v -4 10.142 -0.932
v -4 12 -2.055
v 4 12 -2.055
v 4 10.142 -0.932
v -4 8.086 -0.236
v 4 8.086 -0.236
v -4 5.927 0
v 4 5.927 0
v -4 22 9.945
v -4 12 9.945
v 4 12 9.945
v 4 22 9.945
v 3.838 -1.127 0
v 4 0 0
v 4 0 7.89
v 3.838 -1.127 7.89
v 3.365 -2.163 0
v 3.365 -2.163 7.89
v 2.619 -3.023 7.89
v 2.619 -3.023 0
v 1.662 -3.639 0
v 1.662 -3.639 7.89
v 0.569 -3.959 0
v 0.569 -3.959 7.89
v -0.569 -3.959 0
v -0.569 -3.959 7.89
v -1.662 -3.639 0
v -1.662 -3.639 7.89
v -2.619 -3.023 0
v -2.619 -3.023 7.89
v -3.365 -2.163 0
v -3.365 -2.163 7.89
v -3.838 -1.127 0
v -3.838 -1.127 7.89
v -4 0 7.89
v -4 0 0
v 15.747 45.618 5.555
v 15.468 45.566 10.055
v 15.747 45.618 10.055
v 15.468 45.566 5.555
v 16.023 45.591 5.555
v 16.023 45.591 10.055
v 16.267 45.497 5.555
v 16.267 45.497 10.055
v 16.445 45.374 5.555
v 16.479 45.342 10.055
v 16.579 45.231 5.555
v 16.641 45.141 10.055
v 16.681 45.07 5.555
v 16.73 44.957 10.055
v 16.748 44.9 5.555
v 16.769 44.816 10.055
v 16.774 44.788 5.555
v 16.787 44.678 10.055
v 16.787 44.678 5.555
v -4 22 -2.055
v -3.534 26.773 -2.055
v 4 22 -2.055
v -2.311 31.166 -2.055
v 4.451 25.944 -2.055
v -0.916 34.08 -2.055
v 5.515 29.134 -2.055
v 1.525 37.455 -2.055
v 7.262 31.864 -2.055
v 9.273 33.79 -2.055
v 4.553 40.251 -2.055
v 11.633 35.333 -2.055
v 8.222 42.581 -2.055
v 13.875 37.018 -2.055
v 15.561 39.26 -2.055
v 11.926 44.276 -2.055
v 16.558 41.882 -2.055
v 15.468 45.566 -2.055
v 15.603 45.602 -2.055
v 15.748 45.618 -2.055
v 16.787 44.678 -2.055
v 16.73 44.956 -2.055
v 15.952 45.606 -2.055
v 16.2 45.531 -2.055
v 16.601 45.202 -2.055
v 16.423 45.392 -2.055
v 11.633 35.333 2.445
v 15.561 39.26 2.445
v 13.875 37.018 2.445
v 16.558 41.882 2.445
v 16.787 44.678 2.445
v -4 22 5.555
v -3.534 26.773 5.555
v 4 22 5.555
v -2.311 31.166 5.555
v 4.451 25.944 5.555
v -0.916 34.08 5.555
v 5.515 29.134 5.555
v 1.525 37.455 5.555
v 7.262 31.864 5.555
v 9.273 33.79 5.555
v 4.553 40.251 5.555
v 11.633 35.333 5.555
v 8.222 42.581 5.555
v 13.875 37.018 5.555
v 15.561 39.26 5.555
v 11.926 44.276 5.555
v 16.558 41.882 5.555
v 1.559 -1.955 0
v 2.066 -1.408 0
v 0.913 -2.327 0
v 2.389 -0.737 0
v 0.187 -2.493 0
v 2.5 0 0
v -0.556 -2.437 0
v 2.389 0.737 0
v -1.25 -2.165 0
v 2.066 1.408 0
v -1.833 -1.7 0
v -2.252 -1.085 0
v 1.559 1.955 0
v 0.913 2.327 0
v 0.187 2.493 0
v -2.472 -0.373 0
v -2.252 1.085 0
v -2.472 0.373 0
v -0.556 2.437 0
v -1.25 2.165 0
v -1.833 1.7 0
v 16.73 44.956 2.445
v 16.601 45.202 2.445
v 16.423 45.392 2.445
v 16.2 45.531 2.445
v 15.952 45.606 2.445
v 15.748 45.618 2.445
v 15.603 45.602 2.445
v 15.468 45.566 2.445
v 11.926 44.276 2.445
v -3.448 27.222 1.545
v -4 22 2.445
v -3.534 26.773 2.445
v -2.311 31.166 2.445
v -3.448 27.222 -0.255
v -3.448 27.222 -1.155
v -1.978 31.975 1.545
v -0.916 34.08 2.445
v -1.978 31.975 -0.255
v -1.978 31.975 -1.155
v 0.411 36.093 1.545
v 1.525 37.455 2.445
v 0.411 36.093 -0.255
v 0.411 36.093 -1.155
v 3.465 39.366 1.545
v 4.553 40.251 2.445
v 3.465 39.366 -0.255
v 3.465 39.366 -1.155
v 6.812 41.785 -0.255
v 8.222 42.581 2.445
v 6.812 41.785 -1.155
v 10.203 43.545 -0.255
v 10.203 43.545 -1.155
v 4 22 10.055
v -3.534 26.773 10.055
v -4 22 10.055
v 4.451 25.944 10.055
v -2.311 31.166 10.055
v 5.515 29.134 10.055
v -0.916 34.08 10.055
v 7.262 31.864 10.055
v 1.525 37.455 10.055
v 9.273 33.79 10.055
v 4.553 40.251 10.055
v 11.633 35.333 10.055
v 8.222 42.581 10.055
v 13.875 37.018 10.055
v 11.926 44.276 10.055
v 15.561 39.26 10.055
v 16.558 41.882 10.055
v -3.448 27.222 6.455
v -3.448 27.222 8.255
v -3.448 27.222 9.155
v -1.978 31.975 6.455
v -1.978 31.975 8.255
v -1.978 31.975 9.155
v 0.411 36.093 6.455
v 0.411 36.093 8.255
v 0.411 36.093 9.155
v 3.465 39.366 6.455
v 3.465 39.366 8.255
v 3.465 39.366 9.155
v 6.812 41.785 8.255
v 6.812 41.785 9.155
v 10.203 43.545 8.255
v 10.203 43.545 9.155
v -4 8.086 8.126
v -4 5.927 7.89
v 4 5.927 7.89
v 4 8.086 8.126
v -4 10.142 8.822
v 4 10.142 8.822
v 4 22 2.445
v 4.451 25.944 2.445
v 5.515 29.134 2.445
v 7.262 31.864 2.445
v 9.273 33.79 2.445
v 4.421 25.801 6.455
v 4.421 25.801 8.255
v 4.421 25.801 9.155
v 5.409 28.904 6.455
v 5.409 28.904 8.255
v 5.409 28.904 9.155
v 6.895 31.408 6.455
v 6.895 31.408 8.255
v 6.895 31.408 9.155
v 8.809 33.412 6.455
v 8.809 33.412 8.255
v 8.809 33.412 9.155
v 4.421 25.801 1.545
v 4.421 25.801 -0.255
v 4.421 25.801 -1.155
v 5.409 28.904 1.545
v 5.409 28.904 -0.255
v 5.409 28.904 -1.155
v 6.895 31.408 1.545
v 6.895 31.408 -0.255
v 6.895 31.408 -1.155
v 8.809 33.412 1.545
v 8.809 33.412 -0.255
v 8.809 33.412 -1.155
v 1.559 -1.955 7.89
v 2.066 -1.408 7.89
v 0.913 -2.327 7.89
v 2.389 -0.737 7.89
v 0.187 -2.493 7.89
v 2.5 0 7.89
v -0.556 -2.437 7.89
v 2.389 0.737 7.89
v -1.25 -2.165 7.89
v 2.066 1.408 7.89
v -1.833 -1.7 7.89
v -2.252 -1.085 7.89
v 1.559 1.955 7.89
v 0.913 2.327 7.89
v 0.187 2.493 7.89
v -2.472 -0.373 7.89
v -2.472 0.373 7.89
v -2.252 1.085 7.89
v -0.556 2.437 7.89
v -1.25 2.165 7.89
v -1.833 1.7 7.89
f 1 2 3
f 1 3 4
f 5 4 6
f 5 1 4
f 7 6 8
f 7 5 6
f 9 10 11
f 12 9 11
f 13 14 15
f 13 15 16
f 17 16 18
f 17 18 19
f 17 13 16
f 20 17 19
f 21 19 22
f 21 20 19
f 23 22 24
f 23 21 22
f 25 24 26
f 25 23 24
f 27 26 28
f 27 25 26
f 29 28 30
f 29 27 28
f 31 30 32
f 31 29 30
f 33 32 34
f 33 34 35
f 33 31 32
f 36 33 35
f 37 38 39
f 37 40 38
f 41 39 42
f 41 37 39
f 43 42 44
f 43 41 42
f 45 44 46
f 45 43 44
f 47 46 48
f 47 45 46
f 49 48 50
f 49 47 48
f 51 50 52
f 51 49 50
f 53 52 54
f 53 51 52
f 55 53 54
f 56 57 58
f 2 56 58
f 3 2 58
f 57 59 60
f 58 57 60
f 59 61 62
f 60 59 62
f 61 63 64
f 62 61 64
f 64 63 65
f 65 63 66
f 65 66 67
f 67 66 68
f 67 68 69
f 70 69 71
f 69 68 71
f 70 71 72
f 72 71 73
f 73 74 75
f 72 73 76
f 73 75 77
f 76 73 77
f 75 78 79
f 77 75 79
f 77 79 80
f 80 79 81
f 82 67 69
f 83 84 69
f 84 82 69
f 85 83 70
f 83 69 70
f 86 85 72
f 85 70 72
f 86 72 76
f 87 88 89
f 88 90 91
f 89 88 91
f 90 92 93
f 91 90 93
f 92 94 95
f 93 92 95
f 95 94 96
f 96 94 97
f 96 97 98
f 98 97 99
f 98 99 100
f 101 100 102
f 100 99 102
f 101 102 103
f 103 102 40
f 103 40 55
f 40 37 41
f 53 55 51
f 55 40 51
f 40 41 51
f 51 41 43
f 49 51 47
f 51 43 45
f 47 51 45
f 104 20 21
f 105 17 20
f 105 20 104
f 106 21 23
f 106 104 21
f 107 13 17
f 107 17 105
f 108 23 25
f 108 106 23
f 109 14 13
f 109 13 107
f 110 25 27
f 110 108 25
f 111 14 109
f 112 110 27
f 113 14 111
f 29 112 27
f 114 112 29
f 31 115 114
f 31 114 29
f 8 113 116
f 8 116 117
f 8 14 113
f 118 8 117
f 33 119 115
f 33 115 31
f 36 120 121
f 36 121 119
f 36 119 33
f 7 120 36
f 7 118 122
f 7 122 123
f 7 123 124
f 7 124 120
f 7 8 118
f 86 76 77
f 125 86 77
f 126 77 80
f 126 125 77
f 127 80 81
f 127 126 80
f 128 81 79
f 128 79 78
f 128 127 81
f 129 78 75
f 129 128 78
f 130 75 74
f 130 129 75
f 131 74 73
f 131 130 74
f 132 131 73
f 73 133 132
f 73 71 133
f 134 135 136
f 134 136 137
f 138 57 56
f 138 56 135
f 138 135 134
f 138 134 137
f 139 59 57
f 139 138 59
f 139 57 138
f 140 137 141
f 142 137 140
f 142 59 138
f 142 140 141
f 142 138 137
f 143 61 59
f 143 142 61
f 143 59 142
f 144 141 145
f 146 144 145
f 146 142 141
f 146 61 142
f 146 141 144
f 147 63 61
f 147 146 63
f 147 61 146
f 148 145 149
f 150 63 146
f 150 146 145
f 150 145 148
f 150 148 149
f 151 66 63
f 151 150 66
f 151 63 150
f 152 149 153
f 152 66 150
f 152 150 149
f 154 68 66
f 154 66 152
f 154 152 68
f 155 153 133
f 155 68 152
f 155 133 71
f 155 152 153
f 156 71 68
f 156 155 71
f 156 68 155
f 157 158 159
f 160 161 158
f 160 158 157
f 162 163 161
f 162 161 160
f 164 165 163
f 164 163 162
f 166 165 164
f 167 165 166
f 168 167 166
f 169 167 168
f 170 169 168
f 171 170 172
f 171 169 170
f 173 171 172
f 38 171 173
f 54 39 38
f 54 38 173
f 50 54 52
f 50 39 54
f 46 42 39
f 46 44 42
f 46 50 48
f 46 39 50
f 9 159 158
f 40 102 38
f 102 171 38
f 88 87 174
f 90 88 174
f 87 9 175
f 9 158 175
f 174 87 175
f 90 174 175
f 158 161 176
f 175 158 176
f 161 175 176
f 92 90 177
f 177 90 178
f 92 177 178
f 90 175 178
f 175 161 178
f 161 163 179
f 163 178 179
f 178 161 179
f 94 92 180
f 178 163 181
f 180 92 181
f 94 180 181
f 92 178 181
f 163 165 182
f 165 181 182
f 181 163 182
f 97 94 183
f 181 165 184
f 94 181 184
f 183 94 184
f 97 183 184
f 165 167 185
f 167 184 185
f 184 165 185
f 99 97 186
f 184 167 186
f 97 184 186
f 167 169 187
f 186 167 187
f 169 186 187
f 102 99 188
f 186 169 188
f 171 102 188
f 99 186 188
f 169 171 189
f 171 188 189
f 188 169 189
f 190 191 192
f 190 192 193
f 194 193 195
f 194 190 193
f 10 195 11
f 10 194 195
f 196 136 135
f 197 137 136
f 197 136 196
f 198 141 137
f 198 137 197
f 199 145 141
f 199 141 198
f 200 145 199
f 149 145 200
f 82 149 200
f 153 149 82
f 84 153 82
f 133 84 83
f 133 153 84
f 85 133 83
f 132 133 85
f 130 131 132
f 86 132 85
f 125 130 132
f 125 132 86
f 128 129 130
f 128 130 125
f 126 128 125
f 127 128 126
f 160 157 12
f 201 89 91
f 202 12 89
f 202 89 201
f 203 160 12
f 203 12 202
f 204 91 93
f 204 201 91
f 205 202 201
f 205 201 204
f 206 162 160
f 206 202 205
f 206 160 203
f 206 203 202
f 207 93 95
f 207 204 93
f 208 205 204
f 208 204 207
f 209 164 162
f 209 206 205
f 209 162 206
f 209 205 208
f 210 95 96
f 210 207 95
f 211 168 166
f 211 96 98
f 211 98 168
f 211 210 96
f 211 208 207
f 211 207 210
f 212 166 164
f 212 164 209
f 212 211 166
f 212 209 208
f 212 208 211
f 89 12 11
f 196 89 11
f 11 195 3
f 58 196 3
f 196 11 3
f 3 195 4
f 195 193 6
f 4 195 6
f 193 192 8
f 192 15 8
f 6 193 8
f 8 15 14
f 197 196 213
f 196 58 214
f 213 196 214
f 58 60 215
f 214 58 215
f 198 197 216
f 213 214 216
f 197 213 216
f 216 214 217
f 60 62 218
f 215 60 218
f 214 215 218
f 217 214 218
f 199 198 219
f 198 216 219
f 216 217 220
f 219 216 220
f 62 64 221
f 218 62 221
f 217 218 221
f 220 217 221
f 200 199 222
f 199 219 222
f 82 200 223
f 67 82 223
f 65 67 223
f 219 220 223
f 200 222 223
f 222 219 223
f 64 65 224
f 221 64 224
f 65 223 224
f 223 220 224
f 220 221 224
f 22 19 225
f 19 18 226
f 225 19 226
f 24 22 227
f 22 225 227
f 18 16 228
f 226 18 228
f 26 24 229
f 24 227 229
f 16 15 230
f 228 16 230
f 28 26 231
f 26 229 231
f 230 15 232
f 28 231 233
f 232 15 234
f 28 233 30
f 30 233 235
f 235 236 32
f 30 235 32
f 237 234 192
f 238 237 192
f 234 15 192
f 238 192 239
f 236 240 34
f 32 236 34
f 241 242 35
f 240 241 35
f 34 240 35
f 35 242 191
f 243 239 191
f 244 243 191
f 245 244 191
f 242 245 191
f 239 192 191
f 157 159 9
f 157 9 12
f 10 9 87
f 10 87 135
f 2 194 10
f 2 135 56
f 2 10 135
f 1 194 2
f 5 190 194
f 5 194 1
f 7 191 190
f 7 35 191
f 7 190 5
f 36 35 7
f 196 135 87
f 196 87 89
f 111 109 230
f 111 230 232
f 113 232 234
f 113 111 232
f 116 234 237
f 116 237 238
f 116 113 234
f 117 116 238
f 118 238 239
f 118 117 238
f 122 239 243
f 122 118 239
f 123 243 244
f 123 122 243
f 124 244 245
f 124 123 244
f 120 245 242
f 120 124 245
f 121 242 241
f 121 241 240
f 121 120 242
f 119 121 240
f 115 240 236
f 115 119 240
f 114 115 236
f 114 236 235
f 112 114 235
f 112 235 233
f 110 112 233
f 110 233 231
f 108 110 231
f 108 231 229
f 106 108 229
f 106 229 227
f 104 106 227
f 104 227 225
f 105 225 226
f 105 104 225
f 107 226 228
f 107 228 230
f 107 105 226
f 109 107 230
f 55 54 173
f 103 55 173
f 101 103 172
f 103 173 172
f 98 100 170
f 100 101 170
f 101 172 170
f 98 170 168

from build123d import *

# Parameters (mm, degrees)
ESBO_O3_R                = 2.5
RESSALTO_EXTRUS_O1_DEPTH = 7.89
ESBO_O4_W                = 8
ESBO_O4_H                = 12
RESSALTO_EXTRUS_O2_DEPTH = 10
FILETE1_R                = 10
VARREDURA1_START         = -2.055
VARREDURA1_DEPTH         = 4.5
FILETE2_R                = 10
FILETE3_R                = 1
FILETE2_OF_ESPELHAR1_R   = 10
FILETE3_OF_ESPELHAR1_R   = 1


# Read off the part's stored shape, not the designer's step: Varredura1
with BuildPart() as part:
    # Esboço3 → Ressalto-extrusão1 (new body)
    with BuildSketch(Plane.XY):
        with BuildLine():
            Line((-4, 0), (-4, 12))
            Line((-4, 12), (4, 12))
            Line((4, 12), (4, 0))
            ThreePointArc((4, 0), (0, -4), (-4, 0))
        make_face()
        Circle(ESBO_O3_R, mode=Mode.SUBTRACT)
    extrude(amount=RESSALTO_EXTRUS_O1_DEPTH)

    # Esboço4 → Ressalto-extrusão2 (add)
    with BuildSketch(Plane(origin=(0, 12, 0), x_dir=(1, 0, 0), z_dir=(0, 1, 0))):
        with Locations((0, -3.945)):
            Rectangle(ESBO_O4_W, ESBO_O4_H)
    extrude(amount=RESSALTO_EXTRUS_O2_DEPTH)

    # Filete1
    # the kernel refuses this fillet: 10 mm, written as the material it adds along each edge
    with BuildSketch(Plane(origin=(-4, 12, 0), x_dir=(0, 0, -1), z_dir=(1, 0, 0))) as filete1_piece_1:
        with BuildLine():
            CenterArc((10, -6.072641517), FILETE1_R, 142.608054869, 37.391945131)
            Line((0, -6.072641517), (-0.2, -6.072641517))
            Line((-0.2, -6.072641517), (-0.2, 0))
            Line((-0.2, 0), (0, 0.2))
            ThreePointArc((0, 0.2), (1.0275, 0.2), (1.8961, 0.12145283))
            Line((1.8961, 0.12145283), (2.055, 0))
        make_face()
    extrude(amount=8)
    with BuildSketch(Plane(origin=(-4, 12, 7.89), x_dir=(0, 0, 1), z_dir=(1, 0, 0))) as filete1_piece_2:
        with BuildLine():
            CenterArc((10, 6.072641517), FILETE1_R, 180, 37.391945131)
            Line((0, 6.072641517), (-0.2, 6.072641517))
            Line((-0.2, 6.072641517), (-0.2, 0))
            Line((-0.2, 0), (0, -0.2))
            ThreePointArc((0, -0.2), (1.0275, -0.2), (1.8961, -0.12145283))
            Line((1.8961, -0.12145283), (2.055, 0))
        make_face()
    extrude(amount=8)

    # Varredura1 outline → Varredura1 (add)
    with BuildSketch(Plane.XY.offset(VARREDURA1_START)):
        with BuildLine():
            Line((-4, 22), (4, 22))
            add(Edge.make_bspline(
                [(4, 22), (4.076004643, 24.789100523), (4.576744422, 27.046075873), (5.825537248, 29.832679333), (6.324748717, 30.661737223), (7.465829447, 32.153454516), (8.107698711, 32.816113914), (10.212438301, 34.604326425), (11.854440436, 35.53011384), (15.430236778, 37.114751087), (17.364030989, 37.773600914), (19.350774872, 38.4318674)],
                knots=[0, 0, 0, 0, 0.25, 0.25, 0.375, 0.375, 0.5, 0.5, 0.75, 0.75, 1, 1, 1, 1], degree=3))
            Line((19.350774872, 38.4318674), (16.628722538, 45.954528571))
            add(Edge.make_bspline(
                [(-4, 22), (-3.924365702, 25.610706729), (-3.278889097, 28.990240165), (-1.326924275, 33.467921051), (-0.516042652, 34.853906552), (1.338266133, 37.332612564), (2.378280036, 38.423434753), (5.639368368, 41.249638523), (7.969155498, 42.540719328), (12.436975606, 44.550100168), (14.600059443, 45.281114301), (16.628722538, 45.954528571)],
                knots=[0, 0, 0, 0, 0.25, 0.25, 0.375, 0.375, 0.5, 0.5, 0.75, 0.75, 1, 1, 1, 1], degree=3))
        make_face()
    varredura1 = extrude(amount=VARREDURA1_DEPTH)

    # Filete2
    # the kernel refuses this fillet: 10 mm, written as the material it takes off along each edge
    with BuildSketch(Plane(origin=(19.350774872, 38.4318674, -22.846513703), x_dir=(-0.9279643931477312, -0.3726688678303612, 8.125821655605385e-13), z_dir=(0, 2.1804401593599865e-12, 1.0))) as filete2_piece_1:
        with BuildLine():
            CenterArc((9.534418095, -9.925569628), FILETE2_R, 96.994915397, 71.874930906)
            Line((-0.277493979, -7.99518587), (-0.473732221, -7.956578195))
            ThreePointArc((-0.473732221, -7.956578195), (-0.338626636, -3.990655585), (-0.199879647, 0.006937349))
            Line((-0.199879647, 0.006937349), (0.012379593, 0.199616497))
            ThreePointArc((0.012379593, 0.199616497), (4.158510673, 0.013875219), (8.292249229, 0.198511393))
            Line((8.292249229, 0.198511393), (8.316605481, 0))
        make_face()
    extrude(amount=46.083027405, mode=Mode.SUBTRACT)

    # Filete3
    filete3_edges = [part.edges().sort_by_distance(p)[0] for p in [
        (16.628722538, 45.954528571, 0.195),
    ]]
    fillet(filete3_edges, radius=FILETE3_R)

    # Espelhar1: Varredura1 across plane
    add(varredura1.mirror(Plane.XY.offset(4)))

    # Filete2 of Espelhar1
    # the kernel refuses this fillet: 10 mm, written as the material it takes off along each edge
    with BuildSketch(Plane(origin=(19.350774872, 38.4318674, 30.846513703), x_dir=(-0.34025654174280723, 0.9403326463551213, 2.0503390652699583e-12), z_dir=(0, 2.1804401593599865e-12, -1.0))) as filete2_of_espelhar1_piece_1:
        with BuildLine():
            CenterArc((9.588878802, -9.87296633), FILETE2_OF_ESPELHAR1_R, 99.142350717, 71.874930906)
            Line((-0.288475994, -8.311600828), (-0.48602309, -8.280373518))
            ThreePointArc((-0.48602309, -8.280373518), (-0.158112079, -4.155526935), (-0.199925782, -0.005448096))
            Line((-0.199925782, -0.005448096), (0, 0.2))
            ThreePointArc((0, 0.2), (4, 0.2), (7.968222424, 0.197459327))
            Line((7.968222424, 0.197459327), (8, 0))
        make_face()
    extrude(amount=46.083027405, mode=Mode.SUBTRACT)

    # Filete3 of Espelhar1
    filete3_of_espelhar1_edges = [part.edges().sort_by_distance(p)[0] for p in [
        (16.628722538, 45.954528571, 7.805),
    ]]
    fillet(filete3_of_espelhar1_edges, radius=FILETE3_OF_ESPELHAR1_R)


solid = part.part
